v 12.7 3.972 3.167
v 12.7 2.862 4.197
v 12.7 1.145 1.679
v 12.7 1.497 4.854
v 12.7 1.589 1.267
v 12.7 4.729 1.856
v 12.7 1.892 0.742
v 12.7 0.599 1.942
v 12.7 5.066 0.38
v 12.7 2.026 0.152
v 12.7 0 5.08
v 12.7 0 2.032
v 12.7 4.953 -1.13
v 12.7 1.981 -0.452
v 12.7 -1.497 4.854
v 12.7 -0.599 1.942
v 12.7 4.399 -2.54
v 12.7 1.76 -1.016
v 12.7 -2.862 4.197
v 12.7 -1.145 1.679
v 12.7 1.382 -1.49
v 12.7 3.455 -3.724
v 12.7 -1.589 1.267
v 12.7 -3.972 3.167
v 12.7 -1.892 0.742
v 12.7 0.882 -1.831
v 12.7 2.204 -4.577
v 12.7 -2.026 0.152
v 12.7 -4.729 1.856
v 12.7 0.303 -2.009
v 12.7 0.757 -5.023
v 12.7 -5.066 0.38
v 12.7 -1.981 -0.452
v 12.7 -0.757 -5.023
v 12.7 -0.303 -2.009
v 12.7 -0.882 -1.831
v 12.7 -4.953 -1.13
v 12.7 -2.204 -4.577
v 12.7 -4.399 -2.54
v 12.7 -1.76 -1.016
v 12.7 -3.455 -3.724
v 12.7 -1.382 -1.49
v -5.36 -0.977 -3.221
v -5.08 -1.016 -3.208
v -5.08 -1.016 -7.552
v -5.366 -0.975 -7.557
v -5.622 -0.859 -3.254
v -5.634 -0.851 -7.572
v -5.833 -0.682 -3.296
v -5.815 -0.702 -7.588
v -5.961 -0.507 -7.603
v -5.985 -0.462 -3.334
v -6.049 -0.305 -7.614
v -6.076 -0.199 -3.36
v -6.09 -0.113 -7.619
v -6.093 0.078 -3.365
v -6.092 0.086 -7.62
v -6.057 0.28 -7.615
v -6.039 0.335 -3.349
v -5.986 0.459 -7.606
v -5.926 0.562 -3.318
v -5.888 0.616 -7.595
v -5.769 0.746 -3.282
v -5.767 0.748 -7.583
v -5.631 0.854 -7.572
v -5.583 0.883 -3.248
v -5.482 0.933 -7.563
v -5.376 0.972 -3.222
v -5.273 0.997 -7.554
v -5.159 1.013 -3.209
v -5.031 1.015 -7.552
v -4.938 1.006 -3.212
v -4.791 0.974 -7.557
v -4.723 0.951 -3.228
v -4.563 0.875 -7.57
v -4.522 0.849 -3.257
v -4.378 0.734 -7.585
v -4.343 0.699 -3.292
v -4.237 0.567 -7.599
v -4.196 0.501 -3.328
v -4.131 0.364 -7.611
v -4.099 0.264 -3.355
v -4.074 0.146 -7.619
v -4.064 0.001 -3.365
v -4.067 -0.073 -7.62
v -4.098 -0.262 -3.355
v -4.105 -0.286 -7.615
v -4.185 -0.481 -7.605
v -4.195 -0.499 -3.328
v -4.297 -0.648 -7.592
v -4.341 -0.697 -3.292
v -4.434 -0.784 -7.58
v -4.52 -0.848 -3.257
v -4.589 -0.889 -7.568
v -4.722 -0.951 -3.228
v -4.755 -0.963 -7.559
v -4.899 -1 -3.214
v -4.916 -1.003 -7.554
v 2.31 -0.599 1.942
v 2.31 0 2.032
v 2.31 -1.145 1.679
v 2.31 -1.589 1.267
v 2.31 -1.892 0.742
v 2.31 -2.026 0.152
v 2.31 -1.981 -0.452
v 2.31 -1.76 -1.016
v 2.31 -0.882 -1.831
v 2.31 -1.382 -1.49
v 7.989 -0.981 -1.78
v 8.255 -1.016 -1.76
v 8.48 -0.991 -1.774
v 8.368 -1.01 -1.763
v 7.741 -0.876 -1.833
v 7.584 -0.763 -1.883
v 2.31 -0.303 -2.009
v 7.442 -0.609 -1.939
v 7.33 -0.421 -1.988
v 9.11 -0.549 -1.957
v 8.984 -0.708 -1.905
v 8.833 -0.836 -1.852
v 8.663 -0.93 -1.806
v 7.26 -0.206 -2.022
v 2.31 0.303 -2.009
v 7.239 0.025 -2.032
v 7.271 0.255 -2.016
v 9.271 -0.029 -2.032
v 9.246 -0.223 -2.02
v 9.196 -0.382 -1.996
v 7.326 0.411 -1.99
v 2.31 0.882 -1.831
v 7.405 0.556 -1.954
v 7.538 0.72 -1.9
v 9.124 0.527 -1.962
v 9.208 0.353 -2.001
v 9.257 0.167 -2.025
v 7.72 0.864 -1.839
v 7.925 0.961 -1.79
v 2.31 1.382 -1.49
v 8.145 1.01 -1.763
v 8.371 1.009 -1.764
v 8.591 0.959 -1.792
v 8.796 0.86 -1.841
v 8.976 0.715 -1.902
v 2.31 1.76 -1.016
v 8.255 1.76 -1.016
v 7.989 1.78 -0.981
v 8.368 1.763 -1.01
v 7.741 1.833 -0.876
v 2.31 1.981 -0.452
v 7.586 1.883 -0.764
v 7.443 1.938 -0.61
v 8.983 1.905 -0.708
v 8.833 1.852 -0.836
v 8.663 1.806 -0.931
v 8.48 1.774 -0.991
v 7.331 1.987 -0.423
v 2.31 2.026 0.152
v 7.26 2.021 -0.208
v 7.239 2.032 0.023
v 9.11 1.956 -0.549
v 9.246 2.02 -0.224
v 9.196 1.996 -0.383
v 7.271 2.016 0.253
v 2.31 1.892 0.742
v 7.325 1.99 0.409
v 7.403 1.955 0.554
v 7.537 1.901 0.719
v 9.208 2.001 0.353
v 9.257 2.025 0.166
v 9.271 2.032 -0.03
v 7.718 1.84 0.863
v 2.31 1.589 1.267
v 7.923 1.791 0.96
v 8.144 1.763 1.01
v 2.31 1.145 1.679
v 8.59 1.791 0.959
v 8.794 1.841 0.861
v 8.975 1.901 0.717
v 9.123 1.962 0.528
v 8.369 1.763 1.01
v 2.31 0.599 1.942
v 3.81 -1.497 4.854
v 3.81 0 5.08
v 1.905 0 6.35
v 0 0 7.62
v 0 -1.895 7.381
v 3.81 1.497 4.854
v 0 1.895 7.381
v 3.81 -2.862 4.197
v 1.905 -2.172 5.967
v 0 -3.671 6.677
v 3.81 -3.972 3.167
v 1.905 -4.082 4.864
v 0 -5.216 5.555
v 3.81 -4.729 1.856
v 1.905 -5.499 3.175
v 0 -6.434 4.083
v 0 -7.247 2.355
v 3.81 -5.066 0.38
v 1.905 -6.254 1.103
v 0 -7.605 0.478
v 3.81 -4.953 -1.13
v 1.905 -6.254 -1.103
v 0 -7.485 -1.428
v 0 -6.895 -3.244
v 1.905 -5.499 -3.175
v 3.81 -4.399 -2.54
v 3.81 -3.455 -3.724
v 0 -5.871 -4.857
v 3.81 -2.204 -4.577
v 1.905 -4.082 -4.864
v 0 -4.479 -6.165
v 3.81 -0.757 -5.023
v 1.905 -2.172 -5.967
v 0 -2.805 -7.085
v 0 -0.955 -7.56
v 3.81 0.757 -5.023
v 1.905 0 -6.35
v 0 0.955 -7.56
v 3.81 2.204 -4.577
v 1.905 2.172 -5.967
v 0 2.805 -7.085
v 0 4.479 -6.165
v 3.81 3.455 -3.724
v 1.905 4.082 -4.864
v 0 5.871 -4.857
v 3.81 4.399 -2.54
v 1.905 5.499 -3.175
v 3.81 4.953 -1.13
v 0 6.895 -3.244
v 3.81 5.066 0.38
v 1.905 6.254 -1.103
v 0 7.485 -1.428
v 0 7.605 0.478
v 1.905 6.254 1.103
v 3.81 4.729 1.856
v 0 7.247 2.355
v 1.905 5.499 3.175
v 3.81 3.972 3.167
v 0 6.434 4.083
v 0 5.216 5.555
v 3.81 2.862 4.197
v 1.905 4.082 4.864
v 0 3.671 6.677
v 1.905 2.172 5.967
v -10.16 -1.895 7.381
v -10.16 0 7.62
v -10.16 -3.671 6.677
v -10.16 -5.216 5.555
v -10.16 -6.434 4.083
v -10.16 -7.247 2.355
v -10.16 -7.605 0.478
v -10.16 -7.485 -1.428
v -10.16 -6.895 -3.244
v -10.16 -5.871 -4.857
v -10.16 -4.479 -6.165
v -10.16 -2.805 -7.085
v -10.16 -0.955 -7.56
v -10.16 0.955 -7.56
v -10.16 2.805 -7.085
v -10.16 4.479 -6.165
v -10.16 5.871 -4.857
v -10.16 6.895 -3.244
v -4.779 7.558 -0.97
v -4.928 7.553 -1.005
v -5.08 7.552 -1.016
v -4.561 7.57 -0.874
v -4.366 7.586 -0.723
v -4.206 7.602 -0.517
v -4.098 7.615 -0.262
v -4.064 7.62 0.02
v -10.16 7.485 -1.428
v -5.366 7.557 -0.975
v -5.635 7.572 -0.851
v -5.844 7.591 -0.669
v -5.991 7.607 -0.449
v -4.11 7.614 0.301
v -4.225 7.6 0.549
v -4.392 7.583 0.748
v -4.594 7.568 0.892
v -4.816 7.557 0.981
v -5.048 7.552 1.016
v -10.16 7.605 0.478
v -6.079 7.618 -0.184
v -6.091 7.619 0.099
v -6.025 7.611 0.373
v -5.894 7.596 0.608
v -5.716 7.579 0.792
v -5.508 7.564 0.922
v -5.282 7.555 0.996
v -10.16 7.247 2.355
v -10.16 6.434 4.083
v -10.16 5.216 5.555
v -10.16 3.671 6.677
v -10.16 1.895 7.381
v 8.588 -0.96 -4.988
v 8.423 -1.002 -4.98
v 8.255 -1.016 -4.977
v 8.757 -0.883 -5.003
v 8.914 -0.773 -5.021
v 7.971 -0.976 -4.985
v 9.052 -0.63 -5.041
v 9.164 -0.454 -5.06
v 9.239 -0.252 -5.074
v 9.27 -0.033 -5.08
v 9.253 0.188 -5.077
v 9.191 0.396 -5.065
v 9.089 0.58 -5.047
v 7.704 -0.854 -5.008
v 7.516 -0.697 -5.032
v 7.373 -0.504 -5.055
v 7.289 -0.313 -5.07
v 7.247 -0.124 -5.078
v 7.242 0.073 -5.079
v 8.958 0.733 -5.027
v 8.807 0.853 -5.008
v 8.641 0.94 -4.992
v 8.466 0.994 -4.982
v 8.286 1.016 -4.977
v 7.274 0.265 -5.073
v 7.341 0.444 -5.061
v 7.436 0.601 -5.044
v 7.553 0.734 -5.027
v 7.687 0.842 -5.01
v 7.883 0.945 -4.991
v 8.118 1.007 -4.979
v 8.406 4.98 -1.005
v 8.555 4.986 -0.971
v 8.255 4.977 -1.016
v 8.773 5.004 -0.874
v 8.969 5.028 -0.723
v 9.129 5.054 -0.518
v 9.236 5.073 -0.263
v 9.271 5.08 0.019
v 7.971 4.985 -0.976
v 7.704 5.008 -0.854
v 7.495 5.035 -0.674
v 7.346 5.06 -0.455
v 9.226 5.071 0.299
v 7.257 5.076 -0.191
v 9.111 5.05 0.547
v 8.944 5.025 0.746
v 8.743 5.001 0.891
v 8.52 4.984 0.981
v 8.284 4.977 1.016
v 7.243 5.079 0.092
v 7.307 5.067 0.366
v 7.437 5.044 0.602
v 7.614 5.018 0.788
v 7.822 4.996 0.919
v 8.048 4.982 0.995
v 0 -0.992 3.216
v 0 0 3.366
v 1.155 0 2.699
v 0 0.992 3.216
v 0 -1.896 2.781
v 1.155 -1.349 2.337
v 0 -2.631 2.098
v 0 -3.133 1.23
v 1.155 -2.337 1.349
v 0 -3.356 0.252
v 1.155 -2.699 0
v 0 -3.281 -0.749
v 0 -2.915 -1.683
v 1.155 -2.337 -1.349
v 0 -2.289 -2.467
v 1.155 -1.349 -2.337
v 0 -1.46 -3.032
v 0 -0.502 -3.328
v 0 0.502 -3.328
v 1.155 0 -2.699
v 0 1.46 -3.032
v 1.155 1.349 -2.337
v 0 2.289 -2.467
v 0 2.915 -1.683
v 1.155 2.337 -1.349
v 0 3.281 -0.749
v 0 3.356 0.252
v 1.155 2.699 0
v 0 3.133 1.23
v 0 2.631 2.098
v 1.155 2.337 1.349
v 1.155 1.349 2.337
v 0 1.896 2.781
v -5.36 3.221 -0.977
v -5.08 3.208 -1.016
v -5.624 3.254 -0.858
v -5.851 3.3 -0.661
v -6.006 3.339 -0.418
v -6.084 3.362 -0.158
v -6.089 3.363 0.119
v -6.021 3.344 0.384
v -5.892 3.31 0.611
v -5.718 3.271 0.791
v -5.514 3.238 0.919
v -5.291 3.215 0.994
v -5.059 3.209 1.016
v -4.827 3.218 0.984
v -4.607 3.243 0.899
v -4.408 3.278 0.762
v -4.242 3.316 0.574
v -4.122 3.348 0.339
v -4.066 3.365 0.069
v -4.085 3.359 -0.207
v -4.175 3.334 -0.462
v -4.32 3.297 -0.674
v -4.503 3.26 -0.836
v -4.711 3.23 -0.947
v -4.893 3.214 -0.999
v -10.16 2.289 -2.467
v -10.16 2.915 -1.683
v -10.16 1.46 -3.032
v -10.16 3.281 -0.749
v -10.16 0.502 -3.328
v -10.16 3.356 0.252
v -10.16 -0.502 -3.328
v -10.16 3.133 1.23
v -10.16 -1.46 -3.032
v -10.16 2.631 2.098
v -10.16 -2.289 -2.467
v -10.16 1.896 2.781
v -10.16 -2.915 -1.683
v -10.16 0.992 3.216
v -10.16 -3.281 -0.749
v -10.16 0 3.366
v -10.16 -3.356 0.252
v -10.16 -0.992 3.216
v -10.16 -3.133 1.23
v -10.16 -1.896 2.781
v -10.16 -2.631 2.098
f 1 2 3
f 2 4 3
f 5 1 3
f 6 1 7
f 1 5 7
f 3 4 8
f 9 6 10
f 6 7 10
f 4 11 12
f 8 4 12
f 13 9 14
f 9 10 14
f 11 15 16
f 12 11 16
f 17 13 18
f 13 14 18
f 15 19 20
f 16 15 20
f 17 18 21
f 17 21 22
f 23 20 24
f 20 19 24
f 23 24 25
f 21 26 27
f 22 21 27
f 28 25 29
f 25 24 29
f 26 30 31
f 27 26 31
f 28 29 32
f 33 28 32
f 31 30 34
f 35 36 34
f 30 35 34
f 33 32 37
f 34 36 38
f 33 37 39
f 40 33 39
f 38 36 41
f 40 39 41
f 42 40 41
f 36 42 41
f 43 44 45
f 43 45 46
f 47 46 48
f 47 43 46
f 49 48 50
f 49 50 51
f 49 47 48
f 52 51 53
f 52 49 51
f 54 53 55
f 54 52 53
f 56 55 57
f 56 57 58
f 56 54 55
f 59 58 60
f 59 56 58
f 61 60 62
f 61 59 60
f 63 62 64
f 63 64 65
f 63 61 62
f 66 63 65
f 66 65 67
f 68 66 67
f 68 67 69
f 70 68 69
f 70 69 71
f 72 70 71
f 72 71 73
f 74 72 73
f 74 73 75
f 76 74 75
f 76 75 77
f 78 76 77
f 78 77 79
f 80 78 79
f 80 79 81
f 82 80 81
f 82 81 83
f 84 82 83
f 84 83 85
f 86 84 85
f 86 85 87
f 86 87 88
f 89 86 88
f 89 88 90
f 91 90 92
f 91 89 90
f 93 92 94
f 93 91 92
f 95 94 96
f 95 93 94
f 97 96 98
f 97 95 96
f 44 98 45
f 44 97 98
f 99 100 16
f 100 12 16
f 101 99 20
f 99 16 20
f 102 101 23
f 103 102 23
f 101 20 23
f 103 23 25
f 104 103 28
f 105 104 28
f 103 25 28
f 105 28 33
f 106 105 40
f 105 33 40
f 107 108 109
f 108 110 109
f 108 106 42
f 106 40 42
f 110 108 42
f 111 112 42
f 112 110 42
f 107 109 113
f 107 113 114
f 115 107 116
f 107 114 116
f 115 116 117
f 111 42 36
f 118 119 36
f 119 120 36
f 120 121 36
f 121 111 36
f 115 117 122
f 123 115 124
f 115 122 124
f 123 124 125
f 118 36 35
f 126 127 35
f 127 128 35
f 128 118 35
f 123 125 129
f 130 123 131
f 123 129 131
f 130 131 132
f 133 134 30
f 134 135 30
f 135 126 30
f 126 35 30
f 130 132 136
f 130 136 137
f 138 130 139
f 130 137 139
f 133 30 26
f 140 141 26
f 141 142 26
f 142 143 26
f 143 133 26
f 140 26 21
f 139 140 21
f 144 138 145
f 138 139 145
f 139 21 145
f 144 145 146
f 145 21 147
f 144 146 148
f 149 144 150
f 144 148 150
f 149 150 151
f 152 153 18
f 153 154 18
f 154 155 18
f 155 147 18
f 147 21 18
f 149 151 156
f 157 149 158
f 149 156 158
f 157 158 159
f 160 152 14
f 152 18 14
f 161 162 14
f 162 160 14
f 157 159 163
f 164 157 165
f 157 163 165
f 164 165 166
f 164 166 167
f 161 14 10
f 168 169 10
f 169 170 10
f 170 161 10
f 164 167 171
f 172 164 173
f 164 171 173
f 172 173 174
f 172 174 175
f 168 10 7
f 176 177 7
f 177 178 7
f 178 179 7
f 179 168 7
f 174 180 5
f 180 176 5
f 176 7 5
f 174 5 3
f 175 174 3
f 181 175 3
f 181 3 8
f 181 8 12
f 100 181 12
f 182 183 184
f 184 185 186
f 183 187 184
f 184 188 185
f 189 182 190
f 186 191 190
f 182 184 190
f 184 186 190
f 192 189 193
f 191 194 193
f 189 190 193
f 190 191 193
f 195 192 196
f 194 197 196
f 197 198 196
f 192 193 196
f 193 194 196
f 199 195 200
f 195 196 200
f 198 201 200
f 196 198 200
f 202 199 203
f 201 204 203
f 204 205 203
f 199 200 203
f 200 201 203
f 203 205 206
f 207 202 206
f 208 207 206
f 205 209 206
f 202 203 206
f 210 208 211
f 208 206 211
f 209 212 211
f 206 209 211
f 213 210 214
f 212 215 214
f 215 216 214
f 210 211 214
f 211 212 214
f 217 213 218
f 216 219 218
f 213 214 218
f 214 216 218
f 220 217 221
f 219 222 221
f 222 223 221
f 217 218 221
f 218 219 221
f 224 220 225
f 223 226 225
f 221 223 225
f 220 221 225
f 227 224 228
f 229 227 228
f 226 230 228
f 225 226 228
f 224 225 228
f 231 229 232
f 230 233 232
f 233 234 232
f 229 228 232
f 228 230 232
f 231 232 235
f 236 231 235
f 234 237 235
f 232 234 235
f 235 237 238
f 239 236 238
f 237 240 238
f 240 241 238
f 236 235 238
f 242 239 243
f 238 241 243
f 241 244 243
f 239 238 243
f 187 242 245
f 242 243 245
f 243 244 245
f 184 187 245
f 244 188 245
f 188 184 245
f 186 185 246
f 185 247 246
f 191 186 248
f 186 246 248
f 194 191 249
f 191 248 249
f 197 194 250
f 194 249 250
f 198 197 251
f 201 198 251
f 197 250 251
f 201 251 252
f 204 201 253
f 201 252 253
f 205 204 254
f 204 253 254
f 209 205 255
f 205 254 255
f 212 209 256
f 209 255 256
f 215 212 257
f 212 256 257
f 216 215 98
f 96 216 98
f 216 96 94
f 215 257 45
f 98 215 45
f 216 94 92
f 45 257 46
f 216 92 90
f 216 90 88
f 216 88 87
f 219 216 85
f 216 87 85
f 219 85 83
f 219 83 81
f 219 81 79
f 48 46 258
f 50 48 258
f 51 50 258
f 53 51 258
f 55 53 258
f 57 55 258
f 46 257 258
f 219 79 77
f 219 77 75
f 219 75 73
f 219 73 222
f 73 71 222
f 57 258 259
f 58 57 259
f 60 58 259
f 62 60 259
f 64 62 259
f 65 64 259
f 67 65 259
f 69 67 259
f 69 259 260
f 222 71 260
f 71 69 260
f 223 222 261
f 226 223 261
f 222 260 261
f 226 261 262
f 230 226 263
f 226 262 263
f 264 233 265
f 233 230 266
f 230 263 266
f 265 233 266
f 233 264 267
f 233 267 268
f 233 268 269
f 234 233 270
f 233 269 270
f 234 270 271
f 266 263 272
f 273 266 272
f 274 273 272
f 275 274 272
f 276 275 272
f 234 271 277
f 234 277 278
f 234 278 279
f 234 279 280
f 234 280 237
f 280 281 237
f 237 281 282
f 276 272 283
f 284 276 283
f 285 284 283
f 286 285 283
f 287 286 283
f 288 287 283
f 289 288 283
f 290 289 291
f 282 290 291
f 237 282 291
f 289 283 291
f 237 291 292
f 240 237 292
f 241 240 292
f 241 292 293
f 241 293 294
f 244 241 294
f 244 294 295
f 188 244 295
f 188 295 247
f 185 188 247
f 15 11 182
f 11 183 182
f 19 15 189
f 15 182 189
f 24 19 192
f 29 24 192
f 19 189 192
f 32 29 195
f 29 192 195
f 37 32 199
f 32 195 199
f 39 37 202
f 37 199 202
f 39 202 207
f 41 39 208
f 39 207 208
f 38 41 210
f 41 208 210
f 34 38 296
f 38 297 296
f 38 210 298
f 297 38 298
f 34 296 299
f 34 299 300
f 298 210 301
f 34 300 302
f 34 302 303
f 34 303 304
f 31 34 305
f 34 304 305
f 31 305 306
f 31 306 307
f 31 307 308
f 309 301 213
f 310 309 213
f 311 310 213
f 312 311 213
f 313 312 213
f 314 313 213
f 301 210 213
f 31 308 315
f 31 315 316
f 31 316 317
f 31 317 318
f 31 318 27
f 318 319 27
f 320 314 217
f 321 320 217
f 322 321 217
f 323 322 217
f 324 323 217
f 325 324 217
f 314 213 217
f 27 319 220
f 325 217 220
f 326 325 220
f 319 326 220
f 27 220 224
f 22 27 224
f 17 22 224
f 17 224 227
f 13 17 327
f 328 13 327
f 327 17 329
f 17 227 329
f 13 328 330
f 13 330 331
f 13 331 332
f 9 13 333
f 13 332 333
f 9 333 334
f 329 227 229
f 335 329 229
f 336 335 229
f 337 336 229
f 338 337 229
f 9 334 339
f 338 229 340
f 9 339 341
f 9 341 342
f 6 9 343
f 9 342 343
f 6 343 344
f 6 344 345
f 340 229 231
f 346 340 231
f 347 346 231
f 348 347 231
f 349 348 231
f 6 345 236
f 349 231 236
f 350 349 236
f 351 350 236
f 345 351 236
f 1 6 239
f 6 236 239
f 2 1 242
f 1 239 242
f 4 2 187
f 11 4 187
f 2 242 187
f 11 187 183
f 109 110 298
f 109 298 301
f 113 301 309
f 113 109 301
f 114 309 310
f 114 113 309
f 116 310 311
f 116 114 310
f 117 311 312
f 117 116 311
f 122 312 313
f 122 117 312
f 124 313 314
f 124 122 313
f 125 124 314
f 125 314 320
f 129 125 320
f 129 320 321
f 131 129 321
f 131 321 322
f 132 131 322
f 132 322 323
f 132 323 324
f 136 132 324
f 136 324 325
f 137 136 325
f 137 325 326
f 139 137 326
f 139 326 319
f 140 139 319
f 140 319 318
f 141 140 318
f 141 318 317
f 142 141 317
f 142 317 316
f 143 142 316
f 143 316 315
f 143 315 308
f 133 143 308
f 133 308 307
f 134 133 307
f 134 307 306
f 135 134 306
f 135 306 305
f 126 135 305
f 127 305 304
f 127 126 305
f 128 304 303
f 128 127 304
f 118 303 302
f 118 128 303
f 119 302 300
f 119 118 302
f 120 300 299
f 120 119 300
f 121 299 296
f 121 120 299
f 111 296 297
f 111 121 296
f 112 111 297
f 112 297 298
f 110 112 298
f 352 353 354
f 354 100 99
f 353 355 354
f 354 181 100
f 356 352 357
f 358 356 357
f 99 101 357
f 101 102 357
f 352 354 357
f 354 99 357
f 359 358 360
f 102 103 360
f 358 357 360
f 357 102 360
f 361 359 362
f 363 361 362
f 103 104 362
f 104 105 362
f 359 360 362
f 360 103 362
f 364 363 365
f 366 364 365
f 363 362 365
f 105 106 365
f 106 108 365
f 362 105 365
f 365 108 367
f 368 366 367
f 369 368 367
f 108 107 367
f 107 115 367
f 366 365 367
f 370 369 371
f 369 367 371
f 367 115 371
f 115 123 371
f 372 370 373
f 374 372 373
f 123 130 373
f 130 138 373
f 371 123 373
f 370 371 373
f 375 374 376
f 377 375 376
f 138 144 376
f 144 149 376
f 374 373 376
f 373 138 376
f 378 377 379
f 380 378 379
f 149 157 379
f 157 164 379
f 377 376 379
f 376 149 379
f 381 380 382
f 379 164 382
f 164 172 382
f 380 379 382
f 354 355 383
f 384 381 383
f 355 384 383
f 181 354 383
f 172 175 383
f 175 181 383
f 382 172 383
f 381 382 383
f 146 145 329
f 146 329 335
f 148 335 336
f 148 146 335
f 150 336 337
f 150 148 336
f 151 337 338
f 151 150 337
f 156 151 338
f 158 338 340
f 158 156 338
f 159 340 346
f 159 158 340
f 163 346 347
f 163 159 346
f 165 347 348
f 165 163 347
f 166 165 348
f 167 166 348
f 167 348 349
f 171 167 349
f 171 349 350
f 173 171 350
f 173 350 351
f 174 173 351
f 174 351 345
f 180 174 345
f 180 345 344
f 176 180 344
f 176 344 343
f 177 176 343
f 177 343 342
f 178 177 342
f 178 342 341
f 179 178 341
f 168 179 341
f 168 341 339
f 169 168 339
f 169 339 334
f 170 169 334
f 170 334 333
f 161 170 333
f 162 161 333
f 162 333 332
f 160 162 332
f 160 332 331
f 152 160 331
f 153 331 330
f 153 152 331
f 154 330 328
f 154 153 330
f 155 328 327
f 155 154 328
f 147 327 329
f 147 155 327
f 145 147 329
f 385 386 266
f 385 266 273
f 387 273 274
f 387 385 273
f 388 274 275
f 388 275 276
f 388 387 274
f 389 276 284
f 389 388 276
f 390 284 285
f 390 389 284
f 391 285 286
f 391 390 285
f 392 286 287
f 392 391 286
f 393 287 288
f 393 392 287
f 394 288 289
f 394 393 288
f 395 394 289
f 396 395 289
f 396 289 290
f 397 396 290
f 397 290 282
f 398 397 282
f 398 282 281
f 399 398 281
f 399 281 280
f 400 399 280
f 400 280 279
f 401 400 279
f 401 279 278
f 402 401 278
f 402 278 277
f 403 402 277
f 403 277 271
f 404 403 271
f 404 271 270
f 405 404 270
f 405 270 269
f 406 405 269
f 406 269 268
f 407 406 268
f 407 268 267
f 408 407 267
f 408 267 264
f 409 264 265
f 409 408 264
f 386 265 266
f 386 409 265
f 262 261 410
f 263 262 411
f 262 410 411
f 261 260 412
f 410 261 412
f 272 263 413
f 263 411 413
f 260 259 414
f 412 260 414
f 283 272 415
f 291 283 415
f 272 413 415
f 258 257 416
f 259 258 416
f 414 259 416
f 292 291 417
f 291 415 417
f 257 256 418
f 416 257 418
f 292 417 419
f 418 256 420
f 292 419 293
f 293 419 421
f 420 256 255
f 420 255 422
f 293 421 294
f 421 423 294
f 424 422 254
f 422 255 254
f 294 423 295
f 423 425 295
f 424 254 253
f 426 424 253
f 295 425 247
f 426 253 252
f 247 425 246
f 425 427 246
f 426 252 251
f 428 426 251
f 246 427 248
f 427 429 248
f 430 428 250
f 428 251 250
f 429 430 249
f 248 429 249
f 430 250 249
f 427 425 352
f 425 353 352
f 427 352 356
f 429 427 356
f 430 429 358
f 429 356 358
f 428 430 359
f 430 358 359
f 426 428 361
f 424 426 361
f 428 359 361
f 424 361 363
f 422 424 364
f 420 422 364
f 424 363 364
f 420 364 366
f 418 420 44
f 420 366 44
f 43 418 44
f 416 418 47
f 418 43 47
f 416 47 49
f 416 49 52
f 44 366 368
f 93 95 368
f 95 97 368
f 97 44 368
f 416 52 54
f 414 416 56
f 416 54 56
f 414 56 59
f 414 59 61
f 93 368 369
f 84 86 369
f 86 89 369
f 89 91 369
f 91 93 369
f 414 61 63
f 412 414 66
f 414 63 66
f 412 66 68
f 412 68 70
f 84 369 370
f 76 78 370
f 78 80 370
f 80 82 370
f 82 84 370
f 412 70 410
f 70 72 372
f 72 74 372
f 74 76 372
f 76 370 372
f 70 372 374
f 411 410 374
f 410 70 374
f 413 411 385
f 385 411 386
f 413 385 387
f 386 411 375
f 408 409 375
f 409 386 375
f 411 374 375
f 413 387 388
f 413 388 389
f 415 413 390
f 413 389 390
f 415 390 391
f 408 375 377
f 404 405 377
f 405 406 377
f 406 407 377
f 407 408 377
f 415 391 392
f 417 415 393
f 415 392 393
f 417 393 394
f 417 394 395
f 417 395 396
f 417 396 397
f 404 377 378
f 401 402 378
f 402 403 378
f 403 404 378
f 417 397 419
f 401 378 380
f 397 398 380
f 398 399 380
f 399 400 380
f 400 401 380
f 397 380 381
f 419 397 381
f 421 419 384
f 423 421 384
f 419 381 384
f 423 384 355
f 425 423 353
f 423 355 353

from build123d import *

# Parameters (mm, degrees)
SKETCH2_R          = 1.016
CUT_EXTRUDE1_DEPTH = 17.655893852
CIRPATTERN1_COUNT  = 2
CIRPATTERN1_ANGLE  = 90


with BuildPart() as part:
    # Sketch1 → Revolve1 (revolve)
    with BuildSketch(Plane(origin=(0, 0, 0), x_dir=(1, 0, 0), z_dir=(0, 1, 0)), mode=Mode.PRIVATE) as revolve1_sk:
        Polygon((-10.16, 3.3655), (0, 3.3655), (2.309689752, 2.032), (12.7, 2.032), (12.7, 5.08), (3.81, 5.08), (0, 7.62), (-10.16, 7.62), align=None)
    revolve(revolve1_sk.sketch.rotate(Axis((0, 0, 0), (1, 0, 0)), 180), axis=Axis((0, 0, 0), (1, 0, 0)))

    # Sketch2 → Cut-Extrude1 (cut, through all)
    with BuildSketch(Plane(origin=(0, 0, 0), x_dir=(1, 0, 0), z_dir=(0, 1, 0))):
        with Locations(Location((-5.08, 0, 0), (0, 0, 90))):
            Circle(SKETCH2_R)
        with Locations(Location((8.255, 0, 0), (0, 0, 90))):
            Circle(SKETCH2_R)
    cut_extrude1 = extrude(amount=CUT_EXTRUDE1_DEPTH, mode=Mode.SUBTRACT)

    # CirPattern1: Cut-Extrude1 ×2 about axis
    cirpattern1_axis = Axis((-10.16, 0, 0), (-1, 0, 0))
    for i in range(1, CIRPATTERN1_COUNT):
        add(cut_extrude1.rotate(cirpattern1_axis, i * CIRPATTERN1_ANGLE / (CIRPATTERN1_COUNT - 1)), mode=Mode.SUBTRACT)


solid = part.part
